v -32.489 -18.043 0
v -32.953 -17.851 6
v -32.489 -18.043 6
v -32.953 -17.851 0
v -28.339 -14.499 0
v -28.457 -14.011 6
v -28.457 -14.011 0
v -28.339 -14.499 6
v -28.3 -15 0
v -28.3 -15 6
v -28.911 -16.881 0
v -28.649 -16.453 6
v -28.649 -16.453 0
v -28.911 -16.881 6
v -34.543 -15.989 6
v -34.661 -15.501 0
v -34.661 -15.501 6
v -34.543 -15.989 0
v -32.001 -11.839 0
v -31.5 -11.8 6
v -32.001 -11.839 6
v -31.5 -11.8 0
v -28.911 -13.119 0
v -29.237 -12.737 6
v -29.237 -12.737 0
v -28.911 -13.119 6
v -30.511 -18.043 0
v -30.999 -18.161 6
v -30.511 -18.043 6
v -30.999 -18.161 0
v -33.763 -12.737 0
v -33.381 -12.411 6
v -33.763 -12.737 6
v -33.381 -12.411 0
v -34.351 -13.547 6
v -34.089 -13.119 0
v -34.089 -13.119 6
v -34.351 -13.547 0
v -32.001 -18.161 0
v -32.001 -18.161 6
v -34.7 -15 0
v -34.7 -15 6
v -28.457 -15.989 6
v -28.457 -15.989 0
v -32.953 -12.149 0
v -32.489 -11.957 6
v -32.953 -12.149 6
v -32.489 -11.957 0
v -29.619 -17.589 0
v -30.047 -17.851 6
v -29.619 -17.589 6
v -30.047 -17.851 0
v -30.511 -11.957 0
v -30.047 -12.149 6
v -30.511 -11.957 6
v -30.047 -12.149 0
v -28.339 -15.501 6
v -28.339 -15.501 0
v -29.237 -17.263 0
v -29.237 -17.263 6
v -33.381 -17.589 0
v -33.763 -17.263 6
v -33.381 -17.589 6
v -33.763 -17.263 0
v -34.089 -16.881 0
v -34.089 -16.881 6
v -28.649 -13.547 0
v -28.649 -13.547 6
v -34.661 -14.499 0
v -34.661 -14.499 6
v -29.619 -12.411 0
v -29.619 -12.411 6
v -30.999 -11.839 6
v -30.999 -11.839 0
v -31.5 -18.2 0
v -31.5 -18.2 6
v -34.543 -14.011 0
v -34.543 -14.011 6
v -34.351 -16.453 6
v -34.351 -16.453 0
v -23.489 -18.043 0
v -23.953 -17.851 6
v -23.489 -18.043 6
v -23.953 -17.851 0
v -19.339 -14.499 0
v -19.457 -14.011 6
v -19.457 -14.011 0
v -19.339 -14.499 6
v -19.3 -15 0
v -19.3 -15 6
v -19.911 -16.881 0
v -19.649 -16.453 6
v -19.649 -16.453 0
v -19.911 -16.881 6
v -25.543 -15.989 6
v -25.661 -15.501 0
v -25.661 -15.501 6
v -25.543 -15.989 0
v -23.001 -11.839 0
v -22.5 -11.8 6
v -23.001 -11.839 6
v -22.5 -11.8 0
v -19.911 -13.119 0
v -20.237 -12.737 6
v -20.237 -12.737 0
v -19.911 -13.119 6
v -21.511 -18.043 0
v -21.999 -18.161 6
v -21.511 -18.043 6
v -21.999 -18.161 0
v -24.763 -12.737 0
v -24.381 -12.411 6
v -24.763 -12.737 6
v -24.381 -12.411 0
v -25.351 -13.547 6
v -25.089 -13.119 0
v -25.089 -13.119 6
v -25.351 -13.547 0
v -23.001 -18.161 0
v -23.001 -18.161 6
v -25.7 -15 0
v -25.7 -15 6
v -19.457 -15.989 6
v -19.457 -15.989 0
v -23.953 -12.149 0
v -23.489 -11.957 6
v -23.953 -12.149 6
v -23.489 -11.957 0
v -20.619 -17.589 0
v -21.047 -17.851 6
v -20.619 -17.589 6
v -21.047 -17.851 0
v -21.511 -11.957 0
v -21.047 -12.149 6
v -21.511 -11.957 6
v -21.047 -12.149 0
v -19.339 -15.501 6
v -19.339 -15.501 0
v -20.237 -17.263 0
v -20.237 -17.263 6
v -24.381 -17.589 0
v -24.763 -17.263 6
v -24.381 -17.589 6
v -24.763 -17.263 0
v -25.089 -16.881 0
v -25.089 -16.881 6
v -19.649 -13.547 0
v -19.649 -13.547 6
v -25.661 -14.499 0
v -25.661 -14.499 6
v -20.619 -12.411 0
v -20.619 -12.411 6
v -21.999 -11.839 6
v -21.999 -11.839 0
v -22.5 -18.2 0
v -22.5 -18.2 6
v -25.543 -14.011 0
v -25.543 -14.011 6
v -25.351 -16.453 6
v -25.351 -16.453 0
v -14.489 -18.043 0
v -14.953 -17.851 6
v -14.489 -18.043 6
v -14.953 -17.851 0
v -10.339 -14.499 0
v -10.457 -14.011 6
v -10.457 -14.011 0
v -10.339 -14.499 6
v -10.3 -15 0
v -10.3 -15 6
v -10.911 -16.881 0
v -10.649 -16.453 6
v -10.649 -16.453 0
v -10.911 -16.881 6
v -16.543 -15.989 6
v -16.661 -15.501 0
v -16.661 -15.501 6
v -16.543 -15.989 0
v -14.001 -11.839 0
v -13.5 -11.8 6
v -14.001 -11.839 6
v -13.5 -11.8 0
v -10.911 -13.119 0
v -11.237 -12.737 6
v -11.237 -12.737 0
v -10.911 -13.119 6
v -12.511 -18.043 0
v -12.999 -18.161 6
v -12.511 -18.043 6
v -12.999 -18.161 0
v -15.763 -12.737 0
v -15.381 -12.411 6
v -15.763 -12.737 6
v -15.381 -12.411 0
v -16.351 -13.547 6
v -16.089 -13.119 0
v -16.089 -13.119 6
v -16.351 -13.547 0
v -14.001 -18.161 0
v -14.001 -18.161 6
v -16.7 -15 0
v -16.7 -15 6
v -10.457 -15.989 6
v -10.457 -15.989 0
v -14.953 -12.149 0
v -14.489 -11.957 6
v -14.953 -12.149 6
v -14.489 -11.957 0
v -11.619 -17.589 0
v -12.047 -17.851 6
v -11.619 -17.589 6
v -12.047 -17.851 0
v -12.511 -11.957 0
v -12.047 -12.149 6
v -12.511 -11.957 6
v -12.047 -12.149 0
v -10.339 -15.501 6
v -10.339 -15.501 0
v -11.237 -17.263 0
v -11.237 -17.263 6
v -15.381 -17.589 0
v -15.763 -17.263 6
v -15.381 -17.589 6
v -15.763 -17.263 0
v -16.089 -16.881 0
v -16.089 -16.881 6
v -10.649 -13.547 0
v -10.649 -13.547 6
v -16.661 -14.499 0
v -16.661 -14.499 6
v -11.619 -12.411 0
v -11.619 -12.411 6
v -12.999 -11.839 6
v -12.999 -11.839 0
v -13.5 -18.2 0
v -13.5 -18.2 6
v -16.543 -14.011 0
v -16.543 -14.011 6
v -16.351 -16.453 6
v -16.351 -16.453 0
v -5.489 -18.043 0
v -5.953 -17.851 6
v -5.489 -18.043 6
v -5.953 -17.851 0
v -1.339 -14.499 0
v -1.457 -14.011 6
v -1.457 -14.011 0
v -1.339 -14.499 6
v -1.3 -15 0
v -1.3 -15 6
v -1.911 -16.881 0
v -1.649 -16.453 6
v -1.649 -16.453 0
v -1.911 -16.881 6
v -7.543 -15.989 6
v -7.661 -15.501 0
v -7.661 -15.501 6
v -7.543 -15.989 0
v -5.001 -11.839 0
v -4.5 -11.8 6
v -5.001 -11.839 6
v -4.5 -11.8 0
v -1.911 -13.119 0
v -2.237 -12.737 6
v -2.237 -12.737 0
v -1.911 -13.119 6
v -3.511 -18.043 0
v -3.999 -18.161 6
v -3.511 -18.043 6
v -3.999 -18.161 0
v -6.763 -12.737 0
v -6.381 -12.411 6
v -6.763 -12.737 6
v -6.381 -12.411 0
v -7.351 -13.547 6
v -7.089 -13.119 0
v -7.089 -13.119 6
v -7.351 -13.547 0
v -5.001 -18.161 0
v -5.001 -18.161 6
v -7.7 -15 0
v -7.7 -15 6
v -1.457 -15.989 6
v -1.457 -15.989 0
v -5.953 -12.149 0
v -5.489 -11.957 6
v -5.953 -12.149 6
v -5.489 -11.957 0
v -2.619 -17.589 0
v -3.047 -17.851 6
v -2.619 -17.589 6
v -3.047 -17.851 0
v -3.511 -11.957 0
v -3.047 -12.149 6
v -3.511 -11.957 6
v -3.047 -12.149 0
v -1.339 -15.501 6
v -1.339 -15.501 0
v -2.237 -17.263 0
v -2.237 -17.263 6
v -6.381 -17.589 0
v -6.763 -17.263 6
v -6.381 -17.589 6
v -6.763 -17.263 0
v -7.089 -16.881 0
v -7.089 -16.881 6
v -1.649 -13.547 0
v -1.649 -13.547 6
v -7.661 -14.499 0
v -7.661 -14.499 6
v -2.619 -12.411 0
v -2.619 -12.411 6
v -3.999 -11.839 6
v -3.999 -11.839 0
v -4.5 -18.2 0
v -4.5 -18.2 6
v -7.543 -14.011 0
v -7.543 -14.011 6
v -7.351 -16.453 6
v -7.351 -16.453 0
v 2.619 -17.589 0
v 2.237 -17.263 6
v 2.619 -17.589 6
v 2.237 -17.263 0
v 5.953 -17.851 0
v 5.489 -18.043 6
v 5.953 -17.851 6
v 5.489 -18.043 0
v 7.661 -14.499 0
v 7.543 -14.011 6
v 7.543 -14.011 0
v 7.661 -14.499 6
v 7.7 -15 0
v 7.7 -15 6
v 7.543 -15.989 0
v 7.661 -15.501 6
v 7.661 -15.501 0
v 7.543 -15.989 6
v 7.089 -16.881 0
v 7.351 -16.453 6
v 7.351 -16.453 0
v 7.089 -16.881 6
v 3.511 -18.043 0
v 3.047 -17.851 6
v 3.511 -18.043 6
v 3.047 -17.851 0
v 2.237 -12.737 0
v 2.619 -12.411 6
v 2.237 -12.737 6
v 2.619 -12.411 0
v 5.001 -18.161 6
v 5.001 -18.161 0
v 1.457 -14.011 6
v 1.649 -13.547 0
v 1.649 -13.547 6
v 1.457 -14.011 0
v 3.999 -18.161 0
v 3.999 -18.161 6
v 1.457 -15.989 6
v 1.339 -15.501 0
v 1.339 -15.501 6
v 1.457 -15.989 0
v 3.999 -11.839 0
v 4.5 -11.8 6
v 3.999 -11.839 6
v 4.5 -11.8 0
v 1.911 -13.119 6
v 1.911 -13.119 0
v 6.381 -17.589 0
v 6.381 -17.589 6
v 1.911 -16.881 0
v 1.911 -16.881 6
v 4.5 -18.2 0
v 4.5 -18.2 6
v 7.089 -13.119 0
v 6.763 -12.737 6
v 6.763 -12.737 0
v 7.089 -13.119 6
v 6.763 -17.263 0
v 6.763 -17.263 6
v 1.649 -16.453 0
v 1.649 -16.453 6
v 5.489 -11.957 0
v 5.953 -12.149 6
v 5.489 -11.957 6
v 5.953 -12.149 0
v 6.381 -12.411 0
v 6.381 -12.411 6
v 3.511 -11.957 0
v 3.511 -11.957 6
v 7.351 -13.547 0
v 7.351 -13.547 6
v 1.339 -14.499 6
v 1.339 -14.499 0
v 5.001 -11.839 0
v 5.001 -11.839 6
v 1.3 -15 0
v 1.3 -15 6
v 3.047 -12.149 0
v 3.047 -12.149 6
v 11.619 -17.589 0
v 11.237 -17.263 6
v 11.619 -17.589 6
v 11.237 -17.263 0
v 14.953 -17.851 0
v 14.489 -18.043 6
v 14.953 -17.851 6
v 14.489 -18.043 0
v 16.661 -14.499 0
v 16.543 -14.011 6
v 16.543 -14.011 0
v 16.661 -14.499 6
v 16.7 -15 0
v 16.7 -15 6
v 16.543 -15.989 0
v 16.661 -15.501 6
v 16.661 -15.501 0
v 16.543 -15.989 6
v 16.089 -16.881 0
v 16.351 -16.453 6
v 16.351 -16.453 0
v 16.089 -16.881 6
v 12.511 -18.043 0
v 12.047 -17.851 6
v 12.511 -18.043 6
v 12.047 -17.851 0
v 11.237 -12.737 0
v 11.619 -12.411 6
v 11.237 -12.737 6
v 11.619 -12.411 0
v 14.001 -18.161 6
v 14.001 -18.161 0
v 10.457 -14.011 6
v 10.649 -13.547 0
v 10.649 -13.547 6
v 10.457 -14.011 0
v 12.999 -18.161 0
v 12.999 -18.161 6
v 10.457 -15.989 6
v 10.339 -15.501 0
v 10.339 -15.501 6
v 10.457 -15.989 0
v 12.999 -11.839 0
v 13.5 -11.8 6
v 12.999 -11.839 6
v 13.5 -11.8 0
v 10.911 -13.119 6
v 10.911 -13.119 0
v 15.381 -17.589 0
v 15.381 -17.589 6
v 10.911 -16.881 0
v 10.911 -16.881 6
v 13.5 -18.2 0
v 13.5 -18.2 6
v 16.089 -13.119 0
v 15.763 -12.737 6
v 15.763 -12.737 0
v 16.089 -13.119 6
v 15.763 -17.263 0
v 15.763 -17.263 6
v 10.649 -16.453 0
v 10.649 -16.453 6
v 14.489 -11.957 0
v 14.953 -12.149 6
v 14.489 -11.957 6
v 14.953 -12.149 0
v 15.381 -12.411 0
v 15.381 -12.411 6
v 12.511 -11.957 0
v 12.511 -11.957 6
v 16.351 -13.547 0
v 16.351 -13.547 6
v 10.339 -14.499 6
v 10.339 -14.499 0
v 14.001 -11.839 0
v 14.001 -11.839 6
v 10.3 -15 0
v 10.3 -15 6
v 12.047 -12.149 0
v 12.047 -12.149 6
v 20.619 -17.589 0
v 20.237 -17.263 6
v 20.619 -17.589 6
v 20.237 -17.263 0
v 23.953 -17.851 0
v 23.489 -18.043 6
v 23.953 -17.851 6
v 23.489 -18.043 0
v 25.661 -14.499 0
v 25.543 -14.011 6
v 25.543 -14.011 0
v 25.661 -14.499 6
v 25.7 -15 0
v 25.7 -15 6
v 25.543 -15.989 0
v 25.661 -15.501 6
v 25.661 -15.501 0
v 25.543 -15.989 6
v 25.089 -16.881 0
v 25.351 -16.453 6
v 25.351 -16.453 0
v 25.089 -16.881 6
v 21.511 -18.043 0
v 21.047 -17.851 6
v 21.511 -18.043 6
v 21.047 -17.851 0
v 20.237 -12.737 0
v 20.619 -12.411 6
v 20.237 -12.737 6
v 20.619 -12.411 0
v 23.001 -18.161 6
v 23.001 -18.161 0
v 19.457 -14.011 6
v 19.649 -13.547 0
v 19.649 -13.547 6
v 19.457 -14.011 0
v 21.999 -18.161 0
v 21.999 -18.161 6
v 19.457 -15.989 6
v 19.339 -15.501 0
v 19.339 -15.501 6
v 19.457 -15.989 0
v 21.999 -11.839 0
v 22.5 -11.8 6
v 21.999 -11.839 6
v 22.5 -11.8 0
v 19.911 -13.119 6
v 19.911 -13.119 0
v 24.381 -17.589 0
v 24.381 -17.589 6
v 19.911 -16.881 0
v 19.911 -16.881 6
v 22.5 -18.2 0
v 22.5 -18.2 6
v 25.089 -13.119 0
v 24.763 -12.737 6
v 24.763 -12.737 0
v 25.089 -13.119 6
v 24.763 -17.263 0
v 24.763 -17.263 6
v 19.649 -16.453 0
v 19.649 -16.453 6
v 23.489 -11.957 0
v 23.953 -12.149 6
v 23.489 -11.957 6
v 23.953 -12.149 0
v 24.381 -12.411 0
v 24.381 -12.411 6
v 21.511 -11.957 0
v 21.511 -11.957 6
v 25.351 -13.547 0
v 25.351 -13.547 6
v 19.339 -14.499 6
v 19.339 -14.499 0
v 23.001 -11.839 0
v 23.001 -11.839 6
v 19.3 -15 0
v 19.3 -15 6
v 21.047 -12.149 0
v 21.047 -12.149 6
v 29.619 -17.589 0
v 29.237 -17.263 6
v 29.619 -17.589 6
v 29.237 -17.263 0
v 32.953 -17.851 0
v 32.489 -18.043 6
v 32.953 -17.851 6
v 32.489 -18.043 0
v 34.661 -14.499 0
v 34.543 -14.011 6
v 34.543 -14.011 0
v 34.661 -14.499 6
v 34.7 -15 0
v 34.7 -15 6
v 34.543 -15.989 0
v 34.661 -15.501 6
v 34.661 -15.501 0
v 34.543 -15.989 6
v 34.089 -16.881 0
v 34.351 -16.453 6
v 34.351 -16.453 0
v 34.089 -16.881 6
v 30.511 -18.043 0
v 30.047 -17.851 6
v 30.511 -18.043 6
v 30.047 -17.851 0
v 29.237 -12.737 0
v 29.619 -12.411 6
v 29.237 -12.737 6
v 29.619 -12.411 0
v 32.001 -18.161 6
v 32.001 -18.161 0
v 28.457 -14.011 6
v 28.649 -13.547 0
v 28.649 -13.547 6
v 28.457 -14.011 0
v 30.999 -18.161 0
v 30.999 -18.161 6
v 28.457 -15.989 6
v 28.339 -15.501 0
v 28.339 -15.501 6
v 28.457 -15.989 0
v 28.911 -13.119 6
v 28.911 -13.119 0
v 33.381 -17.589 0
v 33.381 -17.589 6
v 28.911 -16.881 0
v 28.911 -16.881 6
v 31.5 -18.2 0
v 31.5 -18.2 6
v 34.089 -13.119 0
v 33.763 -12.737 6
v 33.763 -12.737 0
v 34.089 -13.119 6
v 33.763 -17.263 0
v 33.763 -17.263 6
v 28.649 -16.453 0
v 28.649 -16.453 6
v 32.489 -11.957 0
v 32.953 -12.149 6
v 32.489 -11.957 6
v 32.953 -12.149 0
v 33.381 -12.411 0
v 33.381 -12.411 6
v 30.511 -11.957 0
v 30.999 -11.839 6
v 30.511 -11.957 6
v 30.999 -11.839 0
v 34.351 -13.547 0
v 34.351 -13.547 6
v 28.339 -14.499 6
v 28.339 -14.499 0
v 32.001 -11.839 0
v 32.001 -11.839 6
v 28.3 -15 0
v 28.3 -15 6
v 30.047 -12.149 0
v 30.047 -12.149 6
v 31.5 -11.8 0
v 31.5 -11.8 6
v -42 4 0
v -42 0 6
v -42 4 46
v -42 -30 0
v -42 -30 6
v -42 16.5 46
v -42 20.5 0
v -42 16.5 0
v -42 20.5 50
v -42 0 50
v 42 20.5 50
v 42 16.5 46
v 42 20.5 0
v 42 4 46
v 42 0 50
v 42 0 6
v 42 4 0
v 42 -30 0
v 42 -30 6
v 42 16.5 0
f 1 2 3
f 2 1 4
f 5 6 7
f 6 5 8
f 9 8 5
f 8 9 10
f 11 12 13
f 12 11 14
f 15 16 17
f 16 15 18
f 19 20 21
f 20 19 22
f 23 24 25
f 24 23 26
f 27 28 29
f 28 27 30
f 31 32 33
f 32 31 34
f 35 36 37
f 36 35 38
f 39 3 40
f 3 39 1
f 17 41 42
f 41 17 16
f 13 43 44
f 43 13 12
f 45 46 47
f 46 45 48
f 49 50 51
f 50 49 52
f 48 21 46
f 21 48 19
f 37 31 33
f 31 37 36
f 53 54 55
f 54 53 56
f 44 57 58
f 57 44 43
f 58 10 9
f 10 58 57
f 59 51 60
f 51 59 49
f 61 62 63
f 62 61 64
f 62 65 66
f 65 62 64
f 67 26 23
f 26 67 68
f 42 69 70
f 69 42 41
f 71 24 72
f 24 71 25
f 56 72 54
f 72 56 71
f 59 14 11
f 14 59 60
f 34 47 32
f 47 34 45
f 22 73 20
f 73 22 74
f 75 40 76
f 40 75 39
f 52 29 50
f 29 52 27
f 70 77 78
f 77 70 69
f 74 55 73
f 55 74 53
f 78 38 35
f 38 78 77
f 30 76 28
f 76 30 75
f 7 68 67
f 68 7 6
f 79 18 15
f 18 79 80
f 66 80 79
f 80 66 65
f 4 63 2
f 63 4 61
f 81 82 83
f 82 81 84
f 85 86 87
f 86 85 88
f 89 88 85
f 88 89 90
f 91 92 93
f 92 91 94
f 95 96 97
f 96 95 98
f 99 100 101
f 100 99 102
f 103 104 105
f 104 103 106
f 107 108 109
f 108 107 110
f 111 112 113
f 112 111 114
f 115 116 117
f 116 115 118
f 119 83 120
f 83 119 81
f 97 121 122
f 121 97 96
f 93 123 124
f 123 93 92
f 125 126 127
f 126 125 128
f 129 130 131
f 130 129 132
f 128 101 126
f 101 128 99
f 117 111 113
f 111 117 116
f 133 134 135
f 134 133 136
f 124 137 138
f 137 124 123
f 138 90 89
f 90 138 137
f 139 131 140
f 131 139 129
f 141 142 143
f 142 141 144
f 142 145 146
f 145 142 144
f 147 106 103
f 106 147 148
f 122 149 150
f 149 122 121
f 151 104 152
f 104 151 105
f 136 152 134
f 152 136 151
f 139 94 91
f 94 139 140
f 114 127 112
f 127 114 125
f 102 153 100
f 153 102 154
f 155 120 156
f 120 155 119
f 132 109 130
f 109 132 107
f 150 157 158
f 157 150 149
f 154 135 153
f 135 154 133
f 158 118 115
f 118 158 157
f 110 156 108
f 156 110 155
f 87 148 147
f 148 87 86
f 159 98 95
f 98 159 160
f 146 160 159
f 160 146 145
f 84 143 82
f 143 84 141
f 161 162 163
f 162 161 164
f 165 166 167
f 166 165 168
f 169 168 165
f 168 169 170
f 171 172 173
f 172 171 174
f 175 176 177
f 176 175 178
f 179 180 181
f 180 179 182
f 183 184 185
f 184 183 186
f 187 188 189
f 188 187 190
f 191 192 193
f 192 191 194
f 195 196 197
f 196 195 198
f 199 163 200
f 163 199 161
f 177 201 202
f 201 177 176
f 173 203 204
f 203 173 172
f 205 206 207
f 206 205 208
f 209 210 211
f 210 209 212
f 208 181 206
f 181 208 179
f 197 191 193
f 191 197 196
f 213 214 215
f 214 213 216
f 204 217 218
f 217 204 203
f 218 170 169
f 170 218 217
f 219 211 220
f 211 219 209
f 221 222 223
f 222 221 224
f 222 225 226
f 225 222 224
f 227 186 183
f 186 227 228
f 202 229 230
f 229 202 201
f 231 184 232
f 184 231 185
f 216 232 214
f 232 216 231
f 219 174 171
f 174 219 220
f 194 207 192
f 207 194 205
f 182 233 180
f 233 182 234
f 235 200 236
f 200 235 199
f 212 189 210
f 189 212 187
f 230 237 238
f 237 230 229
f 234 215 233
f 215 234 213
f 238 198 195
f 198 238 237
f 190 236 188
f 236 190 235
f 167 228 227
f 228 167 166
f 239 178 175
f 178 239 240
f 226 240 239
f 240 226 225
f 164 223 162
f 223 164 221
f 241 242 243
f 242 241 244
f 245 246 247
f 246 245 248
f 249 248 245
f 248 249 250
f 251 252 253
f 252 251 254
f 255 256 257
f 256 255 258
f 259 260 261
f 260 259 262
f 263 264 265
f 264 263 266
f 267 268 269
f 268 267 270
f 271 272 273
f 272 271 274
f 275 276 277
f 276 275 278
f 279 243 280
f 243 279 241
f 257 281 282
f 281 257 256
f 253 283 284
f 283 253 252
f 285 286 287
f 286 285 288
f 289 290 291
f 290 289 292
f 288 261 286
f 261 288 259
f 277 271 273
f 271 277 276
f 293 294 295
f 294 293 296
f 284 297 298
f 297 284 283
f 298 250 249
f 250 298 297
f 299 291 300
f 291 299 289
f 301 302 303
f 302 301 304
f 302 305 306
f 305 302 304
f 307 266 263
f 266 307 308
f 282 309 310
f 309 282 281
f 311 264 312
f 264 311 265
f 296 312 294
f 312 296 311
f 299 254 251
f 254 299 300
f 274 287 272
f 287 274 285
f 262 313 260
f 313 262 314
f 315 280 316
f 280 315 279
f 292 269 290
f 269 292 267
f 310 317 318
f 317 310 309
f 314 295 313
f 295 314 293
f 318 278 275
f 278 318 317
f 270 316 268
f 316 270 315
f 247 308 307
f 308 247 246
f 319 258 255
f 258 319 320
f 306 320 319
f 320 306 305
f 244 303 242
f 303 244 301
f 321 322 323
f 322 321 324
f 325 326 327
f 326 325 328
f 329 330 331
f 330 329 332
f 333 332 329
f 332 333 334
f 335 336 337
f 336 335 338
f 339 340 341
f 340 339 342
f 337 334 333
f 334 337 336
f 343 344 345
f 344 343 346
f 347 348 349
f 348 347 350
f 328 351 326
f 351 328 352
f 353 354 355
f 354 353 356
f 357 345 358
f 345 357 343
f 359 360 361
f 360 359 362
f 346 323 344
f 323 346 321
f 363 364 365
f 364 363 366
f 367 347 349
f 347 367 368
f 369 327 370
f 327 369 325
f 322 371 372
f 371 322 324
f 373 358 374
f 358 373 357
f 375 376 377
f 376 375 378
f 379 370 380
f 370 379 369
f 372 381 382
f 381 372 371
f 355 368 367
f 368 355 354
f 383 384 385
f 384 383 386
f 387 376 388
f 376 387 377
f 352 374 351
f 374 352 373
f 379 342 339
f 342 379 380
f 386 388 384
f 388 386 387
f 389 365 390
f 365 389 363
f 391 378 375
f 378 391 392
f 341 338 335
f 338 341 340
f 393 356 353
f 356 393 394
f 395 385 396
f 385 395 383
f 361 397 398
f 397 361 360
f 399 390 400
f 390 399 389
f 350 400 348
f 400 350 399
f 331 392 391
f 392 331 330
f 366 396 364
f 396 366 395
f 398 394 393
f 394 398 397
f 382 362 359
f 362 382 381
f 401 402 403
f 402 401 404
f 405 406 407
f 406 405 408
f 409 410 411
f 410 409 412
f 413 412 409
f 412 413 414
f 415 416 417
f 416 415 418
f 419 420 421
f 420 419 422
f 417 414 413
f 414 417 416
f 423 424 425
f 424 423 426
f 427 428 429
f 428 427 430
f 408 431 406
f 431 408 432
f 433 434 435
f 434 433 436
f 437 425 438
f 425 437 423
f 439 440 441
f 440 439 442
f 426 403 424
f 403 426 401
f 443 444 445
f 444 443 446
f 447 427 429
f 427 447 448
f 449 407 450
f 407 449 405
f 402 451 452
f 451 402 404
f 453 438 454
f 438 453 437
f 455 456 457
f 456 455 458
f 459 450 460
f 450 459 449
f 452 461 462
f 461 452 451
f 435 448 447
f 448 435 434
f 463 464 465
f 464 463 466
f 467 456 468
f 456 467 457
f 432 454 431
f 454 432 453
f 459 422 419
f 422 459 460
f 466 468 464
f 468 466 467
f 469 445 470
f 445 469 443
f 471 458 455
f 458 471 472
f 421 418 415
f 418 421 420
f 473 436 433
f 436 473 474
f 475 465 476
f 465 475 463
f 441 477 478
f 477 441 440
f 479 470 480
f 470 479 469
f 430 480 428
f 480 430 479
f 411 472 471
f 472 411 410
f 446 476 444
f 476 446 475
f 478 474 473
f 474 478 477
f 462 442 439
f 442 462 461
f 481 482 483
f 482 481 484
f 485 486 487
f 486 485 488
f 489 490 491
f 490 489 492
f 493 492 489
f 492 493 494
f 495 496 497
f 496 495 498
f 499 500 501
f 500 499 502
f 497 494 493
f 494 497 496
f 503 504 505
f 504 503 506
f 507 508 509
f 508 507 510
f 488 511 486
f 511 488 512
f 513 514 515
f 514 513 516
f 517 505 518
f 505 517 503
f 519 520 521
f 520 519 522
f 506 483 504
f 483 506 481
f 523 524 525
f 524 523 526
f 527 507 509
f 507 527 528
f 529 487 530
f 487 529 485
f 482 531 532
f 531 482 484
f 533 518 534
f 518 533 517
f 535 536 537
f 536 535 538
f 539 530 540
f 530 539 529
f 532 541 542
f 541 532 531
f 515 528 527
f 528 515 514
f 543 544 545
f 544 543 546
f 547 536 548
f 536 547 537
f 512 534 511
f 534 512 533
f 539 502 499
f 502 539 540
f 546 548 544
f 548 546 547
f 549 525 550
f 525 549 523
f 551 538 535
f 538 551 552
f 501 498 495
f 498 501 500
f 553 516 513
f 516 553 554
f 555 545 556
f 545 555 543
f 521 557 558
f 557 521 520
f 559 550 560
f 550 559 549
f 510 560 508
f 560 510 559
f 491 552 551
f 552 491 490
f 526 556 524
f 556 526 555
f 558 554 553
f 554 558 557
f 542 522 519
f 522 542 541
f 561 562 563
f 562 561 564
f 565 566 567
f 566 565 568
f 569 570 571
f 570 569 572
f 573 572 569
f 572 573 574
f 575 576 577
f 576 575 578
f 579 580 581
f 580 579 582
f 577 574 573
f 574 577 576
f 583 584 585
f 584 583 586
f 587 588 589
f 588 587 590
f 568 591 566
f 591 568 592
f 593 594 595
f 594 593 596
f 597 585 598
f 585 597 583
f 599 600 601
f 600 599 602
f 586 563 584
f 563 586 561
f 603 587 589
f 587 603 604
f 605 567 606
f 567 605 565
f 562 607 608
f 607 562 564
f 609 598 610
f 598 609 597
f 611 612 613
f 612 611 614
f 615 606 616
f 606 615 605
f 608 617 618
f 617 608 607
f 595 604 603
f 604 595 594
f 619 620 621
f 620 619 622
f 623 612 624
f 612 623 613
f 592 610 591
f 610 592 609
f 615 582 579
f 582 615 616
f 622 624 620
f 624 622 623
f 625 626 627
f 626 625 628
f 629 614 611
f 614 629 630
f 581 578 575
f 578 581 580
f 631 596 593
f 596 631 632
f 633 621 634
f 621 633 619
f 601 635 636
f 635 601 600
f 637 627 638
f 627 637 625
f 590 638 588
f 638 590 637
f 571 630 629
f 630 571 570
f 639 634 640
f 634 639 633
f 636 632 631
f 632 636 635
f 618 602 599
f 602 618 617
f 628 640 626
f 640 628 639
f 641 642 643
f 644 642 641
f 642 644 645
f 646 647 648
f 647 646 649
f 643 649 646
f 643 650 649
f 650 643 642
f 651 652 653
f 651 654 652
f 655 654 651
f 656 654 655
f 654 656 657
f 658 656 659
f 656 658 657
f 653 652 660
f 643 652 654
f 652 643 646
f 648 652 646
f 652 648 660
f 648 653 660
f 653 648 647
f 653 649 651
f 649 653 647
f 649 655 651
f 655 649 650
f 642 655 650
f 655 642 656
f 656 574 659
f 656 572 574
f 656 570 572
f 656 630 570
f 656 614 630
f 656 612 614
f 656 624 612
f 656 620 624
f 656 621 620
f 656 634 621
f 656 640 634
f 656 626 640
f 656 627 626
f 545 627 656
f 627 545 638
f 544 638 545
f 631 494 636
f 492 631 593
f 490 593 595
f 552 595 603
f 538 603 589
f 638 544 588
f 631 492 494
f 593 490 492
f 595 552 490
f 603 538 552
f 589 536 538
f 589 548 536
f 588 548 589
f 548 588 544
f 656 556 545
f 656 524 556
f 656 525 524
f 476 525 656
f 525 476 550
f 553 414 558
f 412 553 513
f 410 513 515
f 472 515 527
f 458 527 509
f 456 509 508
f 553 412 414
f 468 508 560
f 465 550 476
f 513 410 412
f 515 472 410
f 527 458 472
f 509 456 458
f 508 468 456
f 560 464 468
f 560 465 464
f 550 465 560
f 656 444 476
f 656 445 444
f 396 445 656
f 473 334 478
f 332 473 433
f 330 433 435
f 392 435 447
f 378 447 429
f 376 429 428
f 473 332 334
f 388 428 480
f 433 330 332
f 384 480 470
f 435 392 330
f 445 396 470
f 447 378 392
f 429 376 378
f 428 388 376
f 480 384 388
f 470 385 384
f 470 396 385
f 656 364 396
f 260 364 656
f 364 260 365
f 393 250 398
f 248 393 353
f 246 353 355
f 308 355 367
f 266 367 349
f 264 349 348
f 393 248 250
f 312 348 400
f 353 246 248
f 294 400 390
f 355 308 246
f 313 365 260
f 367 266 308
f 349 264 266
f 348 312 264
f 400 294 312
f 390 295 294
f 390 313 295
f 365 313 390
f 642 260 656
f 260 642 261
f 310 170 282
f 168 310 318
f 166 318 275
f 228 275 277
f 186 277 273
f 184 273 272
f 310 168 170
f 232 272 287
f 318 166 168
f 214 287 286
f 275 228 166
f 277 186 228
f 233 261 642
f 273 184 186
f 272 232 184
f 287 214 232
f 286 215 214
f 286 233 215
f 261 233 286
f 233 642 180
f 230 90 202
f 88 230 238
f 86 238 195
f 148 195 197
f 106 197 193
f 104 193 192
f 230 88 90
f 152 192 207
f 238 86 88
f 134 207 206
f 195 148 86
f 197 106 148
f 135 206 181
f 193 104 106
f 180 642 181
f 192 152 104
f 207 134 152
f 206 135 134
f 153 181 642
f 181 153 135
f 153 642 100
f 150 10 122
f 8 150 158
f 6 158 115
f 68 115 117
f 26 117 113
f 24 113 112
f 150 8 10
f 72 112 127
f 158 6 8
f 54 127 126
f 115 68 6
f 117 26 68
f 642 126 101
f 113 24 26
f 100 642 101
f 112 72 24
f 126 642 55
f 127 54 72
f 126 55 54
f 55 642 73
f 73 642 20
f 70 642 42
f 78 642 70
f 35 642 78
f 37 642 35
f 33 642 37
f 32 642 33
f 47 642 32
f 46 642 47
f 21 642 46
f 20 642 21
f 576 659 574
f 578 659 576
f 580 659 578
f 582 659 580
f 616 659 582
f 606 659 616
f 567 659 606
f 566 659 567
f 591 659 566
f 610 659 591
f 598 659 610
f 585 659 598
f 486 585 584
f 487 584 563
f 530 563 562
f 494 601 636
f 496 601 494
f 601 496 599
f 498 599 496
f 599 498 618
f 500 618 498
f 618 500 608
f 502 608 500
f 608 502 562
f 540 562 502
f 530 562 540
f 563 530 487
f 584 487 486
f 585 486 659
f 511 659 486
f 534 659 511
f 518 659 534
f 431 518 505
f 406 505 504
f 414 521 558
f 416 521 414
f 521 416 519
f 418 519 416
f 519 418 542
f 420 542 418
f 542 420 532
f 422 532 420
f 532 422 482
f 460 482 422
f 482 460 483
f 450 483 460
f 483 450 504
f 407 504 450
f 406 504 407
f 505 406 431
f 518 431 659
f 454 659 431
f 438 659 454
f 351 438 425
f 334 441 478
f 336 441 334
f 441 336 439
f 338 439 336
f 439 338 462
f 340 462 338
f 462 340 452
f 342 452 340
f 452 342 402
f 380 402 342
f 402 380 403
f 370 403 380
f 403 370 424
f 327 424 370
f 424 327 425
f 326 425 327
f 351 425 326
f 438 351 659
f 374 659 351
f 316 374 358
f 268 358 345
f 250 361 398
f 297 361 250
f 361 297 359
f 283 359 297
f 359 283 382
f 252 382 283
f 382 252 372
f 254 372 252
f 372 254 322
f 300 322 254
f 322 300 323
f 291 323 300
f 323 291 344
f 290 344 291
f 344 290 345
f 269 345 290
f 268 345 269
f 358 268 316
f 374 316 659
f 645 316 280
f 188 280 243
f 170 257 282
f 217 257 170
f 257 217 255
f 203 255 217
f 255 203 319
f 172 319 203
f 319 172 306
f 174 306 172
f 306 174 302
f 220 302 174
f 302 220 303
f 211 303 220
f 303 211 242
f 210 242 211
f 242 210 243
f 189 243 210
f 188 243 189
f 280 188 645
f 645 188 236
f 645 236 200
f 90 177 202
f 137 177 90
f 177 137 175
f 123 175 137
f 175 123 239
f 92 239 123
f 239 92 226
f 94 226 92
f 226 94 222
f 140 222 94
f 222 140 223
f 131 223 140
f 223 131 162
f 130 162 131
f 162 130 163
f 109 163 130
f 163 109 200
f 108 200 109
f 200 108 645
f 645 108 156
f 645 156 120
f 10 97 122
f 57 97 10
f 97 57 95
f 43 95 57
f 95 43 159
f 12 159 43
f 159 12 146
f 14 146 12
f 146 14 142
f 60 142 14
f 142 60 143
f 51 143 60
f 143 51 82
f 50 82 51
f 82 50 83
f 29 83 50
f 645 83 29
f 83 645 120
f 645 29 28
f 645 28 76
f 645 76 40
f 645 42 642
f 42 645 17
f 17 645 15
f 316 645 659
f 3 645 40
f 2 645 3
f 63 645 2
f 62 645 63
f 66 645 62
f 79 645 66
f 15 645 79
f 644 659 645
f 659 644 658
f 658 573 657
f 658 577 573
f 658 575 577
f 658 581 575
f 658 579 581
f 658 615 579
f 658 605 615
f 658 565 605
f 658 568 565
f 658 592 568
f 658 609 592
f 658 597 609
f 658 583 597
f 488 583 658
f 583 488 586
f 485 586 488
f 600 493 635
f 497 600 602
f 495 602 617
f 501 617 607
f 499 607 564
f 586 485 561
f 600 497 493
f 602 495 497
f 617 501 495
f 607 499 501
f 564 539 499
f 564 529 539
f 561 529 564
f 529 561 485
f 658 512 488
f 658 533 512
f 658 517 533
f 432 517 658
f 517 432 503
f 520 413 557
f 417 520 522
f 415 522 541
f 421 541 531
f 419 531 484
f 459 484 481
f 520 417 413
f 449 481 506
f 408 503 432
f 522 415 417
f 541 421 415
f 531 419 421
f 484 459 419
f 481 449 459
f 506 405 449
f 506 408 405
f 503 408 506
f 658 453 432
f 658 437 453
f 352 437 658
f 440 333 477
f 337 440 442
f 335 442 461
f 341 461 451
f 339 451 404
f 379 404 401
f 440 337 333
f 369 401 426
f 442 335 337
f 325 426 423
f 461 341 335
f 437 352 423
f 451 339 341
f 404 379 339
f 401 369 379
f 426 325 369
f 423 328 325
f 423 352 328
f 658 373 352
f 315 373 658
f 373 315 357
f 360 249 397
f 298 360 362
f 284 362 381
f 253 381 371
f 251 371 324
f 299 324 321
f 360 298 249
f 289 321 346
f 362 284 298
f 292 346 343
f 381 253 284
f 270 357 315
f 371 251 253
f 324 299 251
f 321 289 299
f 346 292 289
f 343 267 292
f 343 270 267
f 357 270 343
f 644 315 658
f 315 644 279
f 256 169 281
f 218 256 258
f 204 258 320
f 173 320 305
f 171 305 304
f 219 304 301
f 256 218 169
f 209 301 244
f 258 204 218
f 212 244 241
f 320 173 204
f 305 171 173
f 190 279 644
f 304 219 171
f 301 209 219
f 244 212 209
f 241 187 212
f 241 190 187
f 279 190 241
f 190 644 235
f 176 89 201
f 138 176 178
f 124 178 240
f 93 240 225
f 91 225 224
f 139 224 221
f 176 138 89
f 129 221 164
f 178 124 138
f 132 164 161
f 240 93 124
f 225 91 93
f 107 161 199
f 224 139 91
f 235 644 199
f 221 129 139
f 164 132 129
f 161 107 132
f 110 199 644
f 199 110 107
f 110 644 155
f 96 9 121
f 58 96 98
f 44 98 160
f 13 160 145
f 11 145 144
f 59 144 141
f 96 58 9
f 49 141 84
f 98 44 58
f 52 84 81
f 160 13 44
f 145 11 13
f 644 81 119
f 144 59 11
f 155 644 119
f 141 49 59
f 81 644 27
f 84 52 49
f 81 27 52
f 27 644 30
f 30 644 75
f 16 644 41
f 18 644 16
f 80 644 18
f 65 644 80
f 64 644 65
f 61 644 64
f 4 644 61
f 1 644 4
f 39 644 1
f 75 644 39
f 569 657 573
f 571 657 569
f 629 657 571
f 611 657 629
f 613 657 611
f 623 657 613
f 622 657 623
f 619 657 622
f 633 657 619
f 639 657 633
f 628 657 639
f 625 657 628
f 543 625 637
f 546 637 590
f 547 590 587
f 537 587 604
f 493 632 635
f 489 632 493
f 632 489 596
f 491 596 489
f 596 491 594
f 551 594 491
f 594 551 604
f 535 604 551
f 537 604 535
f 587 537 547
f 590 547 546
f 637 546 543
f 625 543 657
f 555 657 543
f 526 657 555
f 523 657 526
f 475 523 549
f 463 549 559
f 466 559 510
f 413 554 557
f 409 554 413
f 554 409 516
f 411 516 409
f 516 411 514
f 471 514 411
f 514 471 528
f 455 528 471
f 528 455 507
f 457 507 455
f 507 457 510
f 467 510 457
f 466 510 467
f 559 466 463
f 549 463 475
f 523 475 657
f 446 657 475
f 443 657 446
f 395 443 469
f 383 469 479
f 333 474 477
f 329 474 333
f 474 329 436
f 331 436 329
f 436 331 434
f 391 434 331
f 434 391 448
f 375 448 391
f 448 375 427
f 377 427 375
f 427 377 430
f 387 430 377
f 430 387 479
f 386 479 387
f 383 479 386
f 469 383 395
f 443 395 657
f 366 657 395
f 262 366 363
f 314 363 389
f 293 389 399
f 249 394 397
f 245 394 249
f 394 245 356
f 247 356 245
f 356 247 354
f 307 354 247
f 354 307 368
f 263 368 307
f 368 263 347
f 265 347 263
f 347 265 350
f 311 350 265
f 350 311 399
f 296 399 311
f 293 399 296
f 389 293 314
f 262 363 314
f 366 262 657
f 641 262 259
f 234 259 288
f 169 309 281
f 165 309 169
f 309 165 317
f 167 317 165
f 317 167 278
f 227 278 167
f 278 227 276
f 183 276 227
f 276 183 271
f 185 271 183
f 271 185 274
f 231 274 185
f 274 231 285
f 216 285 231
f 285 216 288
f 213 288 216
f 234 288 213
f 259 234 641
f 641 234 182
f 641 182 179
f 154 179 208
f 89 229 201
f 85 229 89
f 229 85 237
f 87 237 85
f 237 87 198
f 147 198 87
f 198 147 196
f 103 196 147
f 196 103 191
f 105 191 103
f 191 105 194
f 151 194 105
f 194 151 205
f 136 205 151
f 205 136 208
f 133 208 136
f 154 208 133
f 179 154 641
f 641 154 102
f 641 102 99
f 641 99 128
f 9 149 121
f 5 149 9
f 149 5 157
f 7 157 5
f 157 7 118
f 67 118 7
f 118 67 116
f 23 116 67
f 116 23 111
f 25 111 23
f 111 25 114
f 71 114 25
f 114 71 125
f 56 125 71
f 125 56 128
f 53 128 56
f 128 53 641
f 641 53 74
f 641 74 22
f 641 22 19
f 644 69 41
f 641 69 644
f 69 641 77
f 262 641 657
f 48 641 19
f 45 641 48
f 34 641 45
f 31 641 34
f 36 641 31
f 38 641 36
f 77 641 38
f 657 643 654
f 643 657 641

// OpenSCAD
// KNOWN-RIGHT ALTERNATIVE (must pass): a correct part coded independently, the profile as one polygon
// YZ profile as a polygon, extruded along X
difference(){ rotate([90,0,90]) linear_extrude(84,center=true) polygon([[-30,0],[4,0],[4,46],[16.5,46],[16.5,0],[20.5,0],[20.5,50],[0,50],[0,6],[-30,6]]);
 for(i=[0:7]) translate([-31.5+9*i,-15,-1]) cylinder(d=6.4,h=8,$fn=40); }
